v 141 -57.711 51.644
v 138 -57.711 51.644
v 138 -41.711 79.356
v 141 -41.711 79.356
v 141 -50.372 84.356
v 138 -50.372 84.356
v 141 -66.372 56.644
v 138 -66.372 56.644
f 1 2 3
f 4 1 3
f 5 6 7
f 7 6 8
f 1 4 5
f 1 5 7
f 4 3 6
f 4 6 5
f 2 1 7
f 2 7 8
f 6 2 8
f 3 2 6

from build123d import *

# Parameters (mm, degrees)
PAD010_DEPTH    = 148
SKETCH016_W     = 66.569612
SKETCH016_H     = 138
POCKET005_DEPTH = 33.501
POCKET006_DEPTH = 33.501


with BuildPart() as part:
    # Sketch015 → Pad010 (new body)
    with BuildSketch(Plane.YZ):
        Polygon((-71.9393102292, 47), (-63.2790561914, 42), (-36.1435935394, 89), (-44.8038475773, 94), align=None)
    extrude(amount=PAD010_DEPTH)

    # Sketch016 (on Face2 of Pad010) → Pocket005 (cut, through all)
    with BuildSketch(Plane(origin=(0, -65.645825623, 37.9006350946), x_dir=(0, 0.5, 0.8660254038), z_dir=(0, 0.8660254038, -0.5))):
        with Locations((35.248905, 69)):
            Rectangle(SKETCH016_W, SKETCH016_H)
    extrude(amount=-POCKET005_DEPTH, mode=Mode.SUBTRACT)

    # Sketch017 (on Face3 of Pocket005) → Pocket006 (cut, through all)
    with BuildSketch(Plane(origin=(0, -65.645825623, 37.9006350946), x_dir=(0, 0.5, 0.8660254038), z_dir=(0, 0.8660254038, -0.5))):
        Polygon((4.7335388633, 138), (4.7335388633, 148), (59.0044641671, 148), (59.0044641671, 138), (47.8690015152, 138), (47.8690015152, 141), (15.8690015152, 141), (15.8690015152, 138), align=None)
    extrude(amount=-POCKET006_DEPTH, mode=Mode.SUBTRACT)


solid = part.part
